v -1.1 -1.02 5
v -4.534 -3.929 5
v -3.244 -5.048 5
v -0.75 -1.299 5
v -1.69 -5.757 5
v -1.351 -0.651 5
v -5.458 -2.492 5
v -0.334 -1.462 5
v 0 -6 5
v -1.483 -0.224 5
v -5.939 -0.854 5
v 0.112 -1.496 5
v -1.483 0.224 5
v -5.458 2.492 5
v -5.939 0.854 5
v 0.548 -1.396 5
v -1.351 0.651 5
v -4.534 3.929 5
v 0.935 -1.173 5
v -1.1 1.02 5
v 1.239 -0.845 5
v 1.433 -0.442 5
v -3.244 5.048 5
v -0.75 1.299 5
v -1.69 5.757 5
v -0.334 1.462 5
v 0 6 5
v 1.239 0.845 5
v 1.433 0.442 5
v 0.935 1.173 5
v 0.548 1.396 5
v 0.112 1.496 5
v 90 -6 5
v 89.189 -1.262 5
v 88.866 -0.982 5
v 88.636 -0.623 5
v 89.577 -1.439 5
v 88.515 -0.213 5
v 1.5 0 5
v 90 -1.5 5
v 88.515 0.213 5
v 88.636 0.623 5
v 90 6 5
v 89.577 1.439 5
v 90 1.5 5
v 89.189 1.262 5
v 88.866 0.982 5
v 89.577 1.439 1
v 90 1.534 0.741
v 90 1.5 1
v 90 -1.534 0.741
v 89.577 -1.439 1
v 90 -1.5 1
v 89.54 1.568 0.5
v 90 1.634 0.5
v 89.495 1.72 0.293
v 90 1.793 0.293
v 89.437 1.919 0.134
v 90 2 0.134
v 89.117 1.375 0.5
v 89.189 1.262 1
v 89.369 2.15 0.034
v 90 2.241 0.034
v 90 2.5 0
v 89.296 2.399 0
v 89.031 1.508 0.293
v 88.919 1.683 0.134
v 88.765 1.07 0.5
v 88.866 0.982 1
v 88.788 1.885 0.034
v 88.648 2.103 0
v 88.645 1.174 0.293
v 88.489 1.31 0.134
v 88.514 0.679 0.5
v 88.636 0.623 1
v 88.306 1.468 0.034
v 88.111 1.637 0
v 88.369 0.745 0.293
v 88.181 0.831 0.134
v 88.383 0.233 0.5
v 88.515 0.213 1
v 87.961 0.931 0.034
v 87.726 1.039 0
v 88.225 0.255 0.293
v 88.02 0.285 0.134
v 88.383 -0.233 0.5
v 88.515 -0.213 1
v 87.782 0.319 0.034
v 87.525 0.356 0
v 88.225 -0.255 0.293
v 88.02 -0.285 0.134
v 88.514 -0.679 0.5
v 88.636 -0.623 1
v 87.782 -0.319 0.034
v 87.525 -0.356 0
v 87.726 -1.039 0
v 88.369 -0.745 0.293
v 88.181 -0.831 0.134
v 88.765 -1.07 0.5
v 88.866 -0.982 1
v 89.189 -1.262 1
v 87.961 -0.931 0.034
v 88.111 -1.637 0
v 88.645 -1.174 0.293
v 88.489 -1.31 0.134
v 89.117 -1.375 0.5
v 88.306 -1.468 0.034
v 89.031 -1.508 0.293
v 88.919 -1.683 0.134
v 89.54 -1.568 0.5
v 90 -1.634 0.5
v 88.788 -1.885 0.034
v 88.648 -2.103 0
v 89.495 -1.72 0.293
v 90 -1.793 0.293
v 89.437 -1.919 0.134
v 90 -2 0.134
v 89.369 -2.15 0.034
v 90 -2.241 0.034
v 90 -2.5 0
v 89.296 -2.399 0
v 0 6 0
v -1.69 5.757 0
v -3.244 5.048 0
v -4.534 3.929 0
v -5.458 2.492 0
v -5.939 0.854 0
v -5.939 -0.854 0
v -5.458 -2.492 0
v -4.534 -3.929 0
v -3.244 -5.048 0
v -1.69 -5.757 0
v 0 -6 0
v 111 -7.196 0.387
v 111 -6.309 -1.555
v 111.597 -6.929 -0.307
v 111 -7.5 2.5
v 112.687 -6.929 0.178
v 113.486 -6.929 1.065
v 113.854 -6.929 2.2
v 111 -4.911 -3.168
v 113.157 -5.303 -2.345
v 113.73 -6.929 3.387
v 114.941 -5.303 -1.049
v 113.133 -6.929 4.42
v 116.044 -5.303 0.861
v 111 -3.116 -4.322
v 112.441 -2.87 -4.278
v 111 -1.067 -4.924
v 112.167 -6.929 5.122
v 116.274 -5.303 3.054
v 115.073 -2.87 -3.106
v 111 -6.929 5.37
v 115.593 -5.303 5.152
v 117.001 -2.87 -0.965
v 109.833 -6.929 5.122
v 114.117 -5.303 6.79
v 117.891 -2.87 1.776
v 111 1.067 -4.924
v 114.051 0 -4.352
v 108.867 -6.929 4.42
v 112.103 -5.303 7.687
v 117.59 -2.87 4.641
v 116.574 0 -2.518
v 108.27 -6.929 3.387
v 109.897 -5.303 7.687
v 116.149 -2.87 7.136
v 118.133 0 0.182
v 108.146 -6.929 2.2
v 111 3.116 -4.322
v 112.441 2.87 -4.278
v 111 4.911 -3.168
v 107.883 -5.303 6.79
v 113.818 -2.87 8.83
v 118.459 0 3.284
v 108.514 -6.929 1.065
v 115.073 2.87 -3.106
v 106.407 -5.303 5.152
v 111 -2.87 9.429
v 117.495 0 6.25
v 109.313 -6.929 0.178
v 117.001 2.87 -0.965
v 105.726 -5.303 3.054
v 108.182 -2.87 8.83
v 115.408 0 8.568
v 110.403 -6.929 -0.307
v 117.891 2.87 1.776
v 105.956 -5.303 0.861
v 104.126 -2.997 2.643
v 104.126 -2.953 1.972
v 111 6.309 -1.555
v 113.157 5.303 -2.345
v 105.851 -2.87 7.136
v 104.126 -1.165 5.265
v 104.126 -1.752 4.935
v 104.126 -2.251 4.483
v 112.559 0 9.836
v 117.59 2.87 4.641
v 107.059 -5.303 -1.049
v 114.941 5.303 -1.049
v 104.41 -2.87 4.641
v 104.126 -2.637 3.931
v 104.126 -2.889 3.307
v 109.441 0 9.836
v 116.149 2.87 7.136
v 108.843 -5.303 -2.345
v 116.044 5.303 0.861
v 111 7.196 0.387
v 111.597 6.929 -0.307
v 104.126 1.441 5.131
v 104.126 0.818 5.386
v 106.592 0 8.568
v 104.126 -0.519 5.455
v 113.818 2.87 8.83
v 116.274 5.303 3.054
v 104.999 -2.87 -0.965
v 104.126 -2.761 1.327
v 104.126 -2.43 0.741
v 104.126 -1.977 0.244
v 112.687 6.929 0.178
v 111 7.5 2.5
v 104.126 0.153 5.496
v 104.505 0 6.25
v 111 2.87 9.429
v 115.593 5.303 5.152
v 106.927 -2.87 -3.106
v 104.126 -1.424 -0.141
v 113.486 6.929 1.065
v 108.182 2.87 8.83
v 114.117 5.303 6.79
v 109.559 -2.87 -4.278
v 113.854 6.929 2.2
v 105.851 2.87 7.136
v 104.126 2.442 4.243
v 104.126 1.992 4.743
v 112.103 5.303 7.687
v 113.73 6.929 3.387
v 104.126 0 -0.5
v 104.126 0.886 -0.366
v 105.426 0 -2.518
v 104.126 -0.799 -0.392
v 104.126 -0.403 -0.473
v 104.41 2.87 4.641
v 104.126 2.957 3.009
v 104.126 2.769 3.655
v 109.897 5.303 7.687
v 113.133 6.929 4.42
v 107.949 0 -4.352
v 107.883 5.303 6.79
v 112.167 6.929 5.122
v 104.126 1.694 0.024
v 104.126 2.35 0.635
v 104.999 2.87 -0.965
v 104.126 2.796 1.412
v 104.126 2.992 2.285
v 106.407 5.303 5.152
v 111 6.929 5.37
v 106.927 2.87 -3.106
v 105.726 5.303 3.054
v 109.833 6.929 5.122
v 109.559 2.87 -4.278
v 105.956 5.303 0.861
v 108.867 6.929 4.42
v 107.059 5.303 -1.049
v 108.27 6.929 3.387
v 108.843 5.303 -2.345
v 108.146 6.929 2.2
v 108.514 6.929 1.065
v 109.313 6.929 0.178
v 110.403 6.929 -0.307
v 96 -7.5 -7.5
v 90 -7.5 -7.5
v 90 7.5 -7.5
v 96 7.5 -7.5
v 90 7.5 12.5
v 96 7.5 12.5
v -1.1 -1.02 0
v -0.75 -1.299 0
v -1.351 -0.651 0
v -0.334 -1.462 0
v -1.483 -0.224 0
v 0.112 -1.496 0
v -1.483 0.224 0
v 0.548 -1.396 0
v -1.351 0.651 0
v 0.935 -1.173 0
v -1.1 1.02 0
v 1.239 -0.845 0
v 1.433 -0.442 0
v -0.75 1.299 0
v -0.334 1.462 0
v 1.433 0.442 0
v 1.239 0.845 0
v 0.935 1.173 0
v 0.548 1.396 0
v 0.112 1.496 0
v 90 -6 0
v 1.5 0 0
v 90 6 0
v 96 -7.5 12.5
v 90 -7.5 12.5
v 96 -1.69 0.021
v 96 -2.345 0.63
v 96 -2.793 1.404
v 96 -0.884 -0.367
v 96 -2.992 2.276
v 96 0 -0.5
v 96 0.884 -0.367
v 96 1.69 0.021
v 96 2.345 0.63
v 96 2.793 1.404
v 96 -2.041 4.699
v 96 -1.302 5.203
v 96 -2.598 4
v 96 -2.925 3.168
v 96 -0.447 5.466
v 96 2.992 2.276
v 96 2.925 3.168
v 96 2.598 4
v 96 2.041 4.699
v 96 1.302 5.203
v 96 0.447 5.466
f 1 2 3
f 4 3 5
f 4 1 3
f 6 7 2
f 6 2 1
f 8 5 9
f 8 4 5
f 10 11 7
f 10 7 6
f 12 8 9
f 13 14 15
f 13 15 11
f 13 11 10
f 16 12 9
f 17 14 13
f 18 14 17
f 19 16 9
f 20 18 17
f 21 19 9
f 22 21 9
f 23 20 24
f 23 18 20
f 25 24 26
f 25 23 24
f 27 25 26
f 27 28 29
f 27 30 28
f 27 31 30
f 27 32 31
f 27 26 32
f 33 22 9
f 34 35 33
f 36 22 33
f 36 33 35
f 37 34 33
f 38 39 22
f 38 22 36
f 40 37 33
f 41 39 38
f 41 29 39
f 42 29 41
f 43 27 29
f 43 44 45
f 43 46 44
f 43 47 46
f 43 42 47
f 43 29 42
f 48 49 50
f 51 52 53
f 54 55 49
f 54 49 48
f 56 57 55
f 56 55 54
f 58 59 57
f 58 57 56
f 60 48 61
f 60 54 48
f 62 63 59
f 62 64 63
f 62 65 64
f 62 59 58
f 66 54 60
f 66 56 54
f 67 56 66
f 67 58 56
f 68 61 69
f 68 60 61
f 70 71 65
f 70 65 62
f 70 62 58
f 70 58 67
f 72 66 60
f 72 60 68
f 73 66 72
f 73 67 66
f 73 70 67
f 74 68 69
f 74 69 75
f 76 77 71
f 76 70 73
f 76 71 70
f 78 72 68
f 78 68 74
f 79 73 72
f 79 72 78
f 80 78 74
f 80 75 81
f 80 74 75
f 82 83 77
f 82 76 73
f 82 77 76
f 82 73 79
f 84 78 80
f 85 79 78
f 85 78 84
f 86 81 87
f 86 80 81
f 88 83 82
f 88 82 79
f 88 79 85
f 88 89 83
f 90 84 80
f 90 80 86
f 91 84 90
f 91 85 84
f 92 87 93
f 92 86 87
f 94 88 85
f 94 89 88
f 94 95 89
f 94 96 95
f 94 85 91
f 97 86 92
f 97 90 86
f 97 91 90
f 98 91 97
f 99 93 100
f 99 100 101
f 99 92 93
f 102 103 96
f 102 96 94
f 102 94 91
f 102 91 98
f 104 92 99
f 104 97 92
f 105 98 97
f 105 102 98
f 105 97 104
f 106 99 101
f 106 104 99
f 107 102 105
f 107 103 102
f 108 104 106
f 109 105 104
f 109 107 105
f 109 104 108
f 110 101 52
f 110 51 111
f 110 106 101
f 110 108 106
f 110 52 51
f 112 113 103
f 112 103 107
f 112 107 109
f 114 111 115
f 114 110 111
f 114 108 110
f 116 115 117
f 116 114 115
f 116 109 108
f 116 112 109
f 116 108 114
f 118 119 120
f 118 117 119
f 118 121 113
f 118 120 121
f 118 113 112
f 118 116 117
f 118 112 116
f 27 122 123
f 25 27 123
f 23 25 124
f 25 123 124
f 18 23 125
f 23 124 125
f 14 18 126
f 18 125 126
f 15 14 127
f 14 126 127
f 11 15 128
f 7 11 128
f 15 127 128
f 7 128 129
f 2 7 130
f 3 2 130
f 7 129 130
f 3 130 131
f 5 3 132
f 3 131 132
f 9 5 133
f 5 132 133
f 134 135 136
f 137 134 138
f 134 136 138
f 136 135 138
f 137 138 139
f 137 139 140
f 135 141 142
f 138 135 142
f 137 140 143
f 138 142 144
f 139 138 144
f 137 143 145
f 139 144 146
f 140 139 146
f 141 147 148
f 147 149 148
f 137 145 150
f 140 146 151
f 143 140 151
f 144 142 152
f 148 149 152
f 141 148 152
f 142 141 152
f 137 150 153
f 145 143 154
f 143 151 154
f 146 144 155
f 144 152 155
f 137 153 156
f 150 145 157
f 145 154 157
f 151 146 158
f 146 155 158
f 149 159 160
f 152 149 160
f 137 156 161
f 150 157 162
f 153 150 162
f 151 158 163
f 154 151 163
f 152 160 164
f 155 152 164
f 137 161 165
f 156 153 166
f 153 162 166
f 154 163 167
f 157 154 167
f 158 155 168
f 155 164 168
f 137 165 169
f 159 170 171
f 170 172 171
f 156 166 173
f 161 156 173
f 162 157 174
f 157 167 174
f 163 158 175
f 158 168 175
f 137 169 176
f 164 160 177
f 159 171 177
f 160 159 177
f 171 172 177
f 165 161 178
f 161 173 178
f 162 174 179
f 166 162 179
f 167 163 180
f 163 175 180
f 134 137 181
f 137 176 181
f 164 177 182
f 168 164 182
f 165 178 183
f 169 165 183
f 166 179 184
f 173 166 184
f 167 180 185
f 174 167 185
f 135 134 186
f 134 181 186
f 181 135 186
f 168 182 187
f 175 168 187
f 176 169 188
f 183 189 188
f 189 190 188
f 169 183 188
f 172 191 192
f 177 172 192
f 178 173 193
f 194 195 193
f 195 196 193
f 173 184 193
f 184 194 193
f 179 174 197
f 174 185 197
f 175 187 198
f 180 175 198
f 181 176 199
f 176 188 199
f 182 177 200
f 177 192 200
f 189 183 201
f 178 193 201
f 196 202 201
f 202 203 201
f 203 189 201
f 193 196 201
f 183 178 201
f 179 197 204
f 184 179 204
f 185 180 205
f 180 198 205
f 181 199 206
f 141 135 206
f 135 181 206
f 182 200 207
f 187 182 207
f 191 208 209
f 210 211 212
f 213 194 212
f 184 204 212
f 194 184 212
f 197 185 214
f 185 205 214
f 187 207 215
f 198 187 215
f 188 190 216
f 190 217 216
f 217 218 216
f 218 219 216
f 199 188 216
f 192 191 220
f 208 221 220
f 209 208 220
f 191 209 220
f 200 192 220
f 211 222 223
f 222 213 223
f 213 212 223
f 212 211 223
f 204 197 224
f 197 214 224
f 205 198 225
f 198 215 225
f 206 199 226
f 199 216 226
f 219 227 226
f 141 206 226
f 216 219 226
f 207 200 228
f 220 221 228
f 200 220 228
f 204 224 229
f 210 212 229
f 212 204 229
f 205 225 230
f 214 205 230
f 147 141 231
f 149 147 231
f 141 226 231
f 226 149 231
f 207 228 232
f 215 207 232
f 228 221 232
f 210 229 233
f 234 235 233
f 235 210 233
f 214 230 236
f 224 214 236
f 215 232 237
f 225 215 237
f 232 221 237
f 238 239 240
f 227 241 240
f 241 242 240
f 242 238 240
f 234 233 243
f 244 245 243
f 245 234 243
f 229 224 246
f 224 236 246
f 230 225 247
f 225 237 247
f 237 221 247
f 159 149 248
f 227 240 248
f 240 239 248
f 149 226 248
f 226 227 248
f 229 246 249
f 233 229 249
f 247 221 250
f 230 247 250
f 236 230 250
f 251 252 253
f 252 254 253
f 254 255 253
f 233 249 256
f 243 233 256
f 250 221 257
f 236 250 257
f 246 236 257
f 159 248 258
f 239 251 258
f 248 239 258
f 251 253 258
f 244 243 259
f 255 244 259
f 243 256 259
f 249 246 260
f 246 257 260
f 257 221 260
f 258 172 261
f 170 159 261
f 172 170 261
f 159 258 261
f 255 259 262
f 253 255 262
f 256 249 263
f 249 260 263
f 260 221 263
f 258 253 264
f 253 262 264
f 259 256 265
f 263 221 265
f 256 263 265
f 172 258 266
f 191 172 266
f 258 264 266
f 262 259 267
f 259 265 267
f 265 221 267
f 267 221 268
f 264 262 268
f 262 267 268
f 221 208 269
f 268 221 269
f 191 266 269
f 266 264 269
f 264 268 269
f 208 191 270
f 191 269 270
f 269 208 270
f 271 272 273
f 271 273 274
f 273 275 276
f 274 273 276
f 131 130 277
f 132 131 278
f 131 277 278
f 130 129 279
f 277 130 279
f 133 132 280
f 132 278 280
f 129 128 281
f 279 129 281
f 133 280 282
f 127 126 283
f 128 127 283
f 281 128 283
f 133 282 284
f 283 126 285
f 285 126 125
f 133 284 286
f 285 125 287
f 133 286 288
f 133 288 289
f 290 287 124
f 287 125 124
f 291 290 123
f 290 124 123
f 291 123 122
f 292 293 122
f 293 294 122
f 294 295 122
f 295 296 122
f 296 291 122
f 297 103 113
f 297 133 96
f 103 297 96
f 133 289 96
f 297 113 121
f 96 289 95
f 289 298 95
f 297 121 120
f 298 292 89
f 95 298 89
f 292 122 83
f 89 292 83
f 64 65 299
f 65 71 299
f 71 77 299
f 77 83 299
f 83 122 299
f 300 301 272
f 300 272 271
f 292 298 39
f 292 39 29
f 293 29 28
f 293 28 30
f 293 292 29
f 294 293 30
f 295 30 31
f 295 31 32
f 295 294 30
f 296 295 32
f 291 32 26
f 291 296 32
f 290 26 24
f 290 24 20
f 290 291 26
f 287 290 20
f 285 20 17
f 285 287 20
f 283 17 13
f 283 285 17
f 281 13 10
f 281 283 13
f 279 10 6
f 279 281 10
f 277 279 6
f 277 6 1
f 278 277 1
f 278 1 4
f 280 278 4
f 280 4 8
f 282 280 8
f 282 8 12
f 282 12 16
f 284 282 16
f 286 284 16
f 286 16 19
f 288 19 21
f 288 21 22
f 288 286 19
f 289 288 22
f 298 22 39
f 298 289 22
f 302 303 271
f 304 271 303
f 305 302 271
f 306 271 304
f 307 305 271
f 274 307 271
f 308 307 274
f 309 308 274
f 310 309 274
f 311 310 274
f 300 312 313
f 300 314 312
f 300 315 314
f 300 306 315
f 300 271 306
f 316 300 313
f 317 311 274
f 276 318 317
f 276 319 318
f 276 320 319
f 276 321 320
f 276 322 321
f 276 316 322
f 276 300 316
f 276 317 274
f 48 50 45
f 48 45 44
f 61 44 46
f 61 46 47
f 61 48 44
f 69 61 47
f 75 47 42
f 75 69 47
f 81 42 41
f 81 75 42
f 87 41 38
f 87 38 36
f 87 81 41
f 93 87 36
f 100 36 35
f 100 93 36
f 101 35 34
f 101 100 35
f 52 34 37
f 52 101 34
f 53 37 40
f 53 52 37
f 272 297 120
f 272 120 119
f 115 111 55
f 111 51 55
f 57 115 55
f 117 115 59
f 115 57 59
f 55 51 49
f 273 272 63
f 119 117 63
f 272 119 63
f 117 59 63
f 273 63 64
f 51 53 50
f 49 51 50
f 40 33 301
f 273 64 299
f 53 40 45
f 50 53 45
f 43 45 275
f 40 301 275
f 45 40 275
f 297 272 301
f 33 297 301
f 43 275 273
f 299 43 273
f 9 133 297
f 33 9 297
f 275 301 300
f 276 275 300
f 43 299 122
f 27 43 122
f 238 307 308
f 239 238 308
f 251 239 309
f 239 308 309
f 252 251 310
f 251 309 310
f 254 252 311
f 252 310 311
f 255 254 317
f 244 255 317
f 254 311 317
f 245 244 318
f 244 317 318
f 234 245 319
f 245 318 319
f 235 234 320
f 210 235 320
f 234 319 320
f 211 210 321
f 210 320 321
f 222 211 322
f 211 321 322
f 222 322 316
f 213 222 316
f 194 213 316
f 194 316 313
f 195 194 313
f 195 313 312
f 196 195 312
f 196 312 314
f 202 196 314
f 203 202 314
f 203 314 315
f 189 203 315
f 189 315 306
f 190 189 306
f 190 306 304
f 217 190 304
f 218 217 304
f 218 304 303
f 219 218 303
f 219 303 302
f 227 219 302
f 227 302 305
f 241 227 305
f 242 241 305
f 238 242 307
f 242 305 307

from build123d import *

# Parameters (mm, degrees)
SKETCH1_R           = 1.5
BOSS_EXTRUDE1_DEPTH = 5
FILLET3_R           = 1
BOSS_EXTRUDE2_START = 7.5
SKETCH4_W           = 6
SKETCH4_H           = 15
BOSS_EXTRUDE2_DEPTH = 20
SKETCH5_R           = 3
BOSS_EXTRUDE3_DEPTH = 15


with BuildPart() as part:
    # Sketch1 → Boss-Extrude1 (new body)
    with BuildSketch(Plane.XY):
        with BuildLine():
            ThreePointArc((0, 6), (-6, 0), (0, -6))
            Line((0, -6), (90, -6))
            ThreePointArc((90, -6), (96, 0), (90, 6))
            Line((90, 6), (0, 6))
        make_face()
        Circle(SKETCH1_R, mode=Mode.SUBTRACT)
        with Locations((90, 0)):
            Circle(SKETCH1_R, mode=Mode.SUBTRACT)
    extrude(amount=BOSS_EXTRUDE1_DEPTH)

    # Fillet3
    fillet3_edges = [part.edges().sort_by_distance(p)[0] for p in [
        (88.5, 0, 0),
    ]]
    fillet(fillet3_edges, radius=FILLET3_R)

    # Sketch4 → Boss-Extrude2 (add)
    with BuildSketch(Plane.XY.offset(5).offset(BOSS_EXTRUDE2_START)):
        with Locations((93, 0)):
            Rectangle(SKETCH4_W, SKETCH4_H)
    extrude(amount=-BOSS_EXTRUDE2_DEPTH)

    # Sketch5 → Boss-Extrude3 (add)
    with BuildSketch(Plane(origin=(96, 0, 0), x_dir=(0, 0, -1), z_dir=(1, 0, 0))):
        with Locations((-2.5, 0)):
            Circle(SKETCH5_R)
    extrude(amount=BOSS_EXTRUDE3_DEPTH)

    # Sketch6 → Revolve1 (revolve)
    with BuildSketch(Plane(origin=(111, 0, 0), x_dir=(0, 0, -1), z_dir=(1, 0, 0))):
        with BuildLine():
            Line((-2.5, 7.5), (-2.5, -7.5))
            ThreePointArc((-2.5, -7.5), (5, 0), (-2.5, 7.5))
        make_face()
    revolve(axis=Axis((111, 7.5, 2.5), (0, -1, 0)))


solid = part.part
